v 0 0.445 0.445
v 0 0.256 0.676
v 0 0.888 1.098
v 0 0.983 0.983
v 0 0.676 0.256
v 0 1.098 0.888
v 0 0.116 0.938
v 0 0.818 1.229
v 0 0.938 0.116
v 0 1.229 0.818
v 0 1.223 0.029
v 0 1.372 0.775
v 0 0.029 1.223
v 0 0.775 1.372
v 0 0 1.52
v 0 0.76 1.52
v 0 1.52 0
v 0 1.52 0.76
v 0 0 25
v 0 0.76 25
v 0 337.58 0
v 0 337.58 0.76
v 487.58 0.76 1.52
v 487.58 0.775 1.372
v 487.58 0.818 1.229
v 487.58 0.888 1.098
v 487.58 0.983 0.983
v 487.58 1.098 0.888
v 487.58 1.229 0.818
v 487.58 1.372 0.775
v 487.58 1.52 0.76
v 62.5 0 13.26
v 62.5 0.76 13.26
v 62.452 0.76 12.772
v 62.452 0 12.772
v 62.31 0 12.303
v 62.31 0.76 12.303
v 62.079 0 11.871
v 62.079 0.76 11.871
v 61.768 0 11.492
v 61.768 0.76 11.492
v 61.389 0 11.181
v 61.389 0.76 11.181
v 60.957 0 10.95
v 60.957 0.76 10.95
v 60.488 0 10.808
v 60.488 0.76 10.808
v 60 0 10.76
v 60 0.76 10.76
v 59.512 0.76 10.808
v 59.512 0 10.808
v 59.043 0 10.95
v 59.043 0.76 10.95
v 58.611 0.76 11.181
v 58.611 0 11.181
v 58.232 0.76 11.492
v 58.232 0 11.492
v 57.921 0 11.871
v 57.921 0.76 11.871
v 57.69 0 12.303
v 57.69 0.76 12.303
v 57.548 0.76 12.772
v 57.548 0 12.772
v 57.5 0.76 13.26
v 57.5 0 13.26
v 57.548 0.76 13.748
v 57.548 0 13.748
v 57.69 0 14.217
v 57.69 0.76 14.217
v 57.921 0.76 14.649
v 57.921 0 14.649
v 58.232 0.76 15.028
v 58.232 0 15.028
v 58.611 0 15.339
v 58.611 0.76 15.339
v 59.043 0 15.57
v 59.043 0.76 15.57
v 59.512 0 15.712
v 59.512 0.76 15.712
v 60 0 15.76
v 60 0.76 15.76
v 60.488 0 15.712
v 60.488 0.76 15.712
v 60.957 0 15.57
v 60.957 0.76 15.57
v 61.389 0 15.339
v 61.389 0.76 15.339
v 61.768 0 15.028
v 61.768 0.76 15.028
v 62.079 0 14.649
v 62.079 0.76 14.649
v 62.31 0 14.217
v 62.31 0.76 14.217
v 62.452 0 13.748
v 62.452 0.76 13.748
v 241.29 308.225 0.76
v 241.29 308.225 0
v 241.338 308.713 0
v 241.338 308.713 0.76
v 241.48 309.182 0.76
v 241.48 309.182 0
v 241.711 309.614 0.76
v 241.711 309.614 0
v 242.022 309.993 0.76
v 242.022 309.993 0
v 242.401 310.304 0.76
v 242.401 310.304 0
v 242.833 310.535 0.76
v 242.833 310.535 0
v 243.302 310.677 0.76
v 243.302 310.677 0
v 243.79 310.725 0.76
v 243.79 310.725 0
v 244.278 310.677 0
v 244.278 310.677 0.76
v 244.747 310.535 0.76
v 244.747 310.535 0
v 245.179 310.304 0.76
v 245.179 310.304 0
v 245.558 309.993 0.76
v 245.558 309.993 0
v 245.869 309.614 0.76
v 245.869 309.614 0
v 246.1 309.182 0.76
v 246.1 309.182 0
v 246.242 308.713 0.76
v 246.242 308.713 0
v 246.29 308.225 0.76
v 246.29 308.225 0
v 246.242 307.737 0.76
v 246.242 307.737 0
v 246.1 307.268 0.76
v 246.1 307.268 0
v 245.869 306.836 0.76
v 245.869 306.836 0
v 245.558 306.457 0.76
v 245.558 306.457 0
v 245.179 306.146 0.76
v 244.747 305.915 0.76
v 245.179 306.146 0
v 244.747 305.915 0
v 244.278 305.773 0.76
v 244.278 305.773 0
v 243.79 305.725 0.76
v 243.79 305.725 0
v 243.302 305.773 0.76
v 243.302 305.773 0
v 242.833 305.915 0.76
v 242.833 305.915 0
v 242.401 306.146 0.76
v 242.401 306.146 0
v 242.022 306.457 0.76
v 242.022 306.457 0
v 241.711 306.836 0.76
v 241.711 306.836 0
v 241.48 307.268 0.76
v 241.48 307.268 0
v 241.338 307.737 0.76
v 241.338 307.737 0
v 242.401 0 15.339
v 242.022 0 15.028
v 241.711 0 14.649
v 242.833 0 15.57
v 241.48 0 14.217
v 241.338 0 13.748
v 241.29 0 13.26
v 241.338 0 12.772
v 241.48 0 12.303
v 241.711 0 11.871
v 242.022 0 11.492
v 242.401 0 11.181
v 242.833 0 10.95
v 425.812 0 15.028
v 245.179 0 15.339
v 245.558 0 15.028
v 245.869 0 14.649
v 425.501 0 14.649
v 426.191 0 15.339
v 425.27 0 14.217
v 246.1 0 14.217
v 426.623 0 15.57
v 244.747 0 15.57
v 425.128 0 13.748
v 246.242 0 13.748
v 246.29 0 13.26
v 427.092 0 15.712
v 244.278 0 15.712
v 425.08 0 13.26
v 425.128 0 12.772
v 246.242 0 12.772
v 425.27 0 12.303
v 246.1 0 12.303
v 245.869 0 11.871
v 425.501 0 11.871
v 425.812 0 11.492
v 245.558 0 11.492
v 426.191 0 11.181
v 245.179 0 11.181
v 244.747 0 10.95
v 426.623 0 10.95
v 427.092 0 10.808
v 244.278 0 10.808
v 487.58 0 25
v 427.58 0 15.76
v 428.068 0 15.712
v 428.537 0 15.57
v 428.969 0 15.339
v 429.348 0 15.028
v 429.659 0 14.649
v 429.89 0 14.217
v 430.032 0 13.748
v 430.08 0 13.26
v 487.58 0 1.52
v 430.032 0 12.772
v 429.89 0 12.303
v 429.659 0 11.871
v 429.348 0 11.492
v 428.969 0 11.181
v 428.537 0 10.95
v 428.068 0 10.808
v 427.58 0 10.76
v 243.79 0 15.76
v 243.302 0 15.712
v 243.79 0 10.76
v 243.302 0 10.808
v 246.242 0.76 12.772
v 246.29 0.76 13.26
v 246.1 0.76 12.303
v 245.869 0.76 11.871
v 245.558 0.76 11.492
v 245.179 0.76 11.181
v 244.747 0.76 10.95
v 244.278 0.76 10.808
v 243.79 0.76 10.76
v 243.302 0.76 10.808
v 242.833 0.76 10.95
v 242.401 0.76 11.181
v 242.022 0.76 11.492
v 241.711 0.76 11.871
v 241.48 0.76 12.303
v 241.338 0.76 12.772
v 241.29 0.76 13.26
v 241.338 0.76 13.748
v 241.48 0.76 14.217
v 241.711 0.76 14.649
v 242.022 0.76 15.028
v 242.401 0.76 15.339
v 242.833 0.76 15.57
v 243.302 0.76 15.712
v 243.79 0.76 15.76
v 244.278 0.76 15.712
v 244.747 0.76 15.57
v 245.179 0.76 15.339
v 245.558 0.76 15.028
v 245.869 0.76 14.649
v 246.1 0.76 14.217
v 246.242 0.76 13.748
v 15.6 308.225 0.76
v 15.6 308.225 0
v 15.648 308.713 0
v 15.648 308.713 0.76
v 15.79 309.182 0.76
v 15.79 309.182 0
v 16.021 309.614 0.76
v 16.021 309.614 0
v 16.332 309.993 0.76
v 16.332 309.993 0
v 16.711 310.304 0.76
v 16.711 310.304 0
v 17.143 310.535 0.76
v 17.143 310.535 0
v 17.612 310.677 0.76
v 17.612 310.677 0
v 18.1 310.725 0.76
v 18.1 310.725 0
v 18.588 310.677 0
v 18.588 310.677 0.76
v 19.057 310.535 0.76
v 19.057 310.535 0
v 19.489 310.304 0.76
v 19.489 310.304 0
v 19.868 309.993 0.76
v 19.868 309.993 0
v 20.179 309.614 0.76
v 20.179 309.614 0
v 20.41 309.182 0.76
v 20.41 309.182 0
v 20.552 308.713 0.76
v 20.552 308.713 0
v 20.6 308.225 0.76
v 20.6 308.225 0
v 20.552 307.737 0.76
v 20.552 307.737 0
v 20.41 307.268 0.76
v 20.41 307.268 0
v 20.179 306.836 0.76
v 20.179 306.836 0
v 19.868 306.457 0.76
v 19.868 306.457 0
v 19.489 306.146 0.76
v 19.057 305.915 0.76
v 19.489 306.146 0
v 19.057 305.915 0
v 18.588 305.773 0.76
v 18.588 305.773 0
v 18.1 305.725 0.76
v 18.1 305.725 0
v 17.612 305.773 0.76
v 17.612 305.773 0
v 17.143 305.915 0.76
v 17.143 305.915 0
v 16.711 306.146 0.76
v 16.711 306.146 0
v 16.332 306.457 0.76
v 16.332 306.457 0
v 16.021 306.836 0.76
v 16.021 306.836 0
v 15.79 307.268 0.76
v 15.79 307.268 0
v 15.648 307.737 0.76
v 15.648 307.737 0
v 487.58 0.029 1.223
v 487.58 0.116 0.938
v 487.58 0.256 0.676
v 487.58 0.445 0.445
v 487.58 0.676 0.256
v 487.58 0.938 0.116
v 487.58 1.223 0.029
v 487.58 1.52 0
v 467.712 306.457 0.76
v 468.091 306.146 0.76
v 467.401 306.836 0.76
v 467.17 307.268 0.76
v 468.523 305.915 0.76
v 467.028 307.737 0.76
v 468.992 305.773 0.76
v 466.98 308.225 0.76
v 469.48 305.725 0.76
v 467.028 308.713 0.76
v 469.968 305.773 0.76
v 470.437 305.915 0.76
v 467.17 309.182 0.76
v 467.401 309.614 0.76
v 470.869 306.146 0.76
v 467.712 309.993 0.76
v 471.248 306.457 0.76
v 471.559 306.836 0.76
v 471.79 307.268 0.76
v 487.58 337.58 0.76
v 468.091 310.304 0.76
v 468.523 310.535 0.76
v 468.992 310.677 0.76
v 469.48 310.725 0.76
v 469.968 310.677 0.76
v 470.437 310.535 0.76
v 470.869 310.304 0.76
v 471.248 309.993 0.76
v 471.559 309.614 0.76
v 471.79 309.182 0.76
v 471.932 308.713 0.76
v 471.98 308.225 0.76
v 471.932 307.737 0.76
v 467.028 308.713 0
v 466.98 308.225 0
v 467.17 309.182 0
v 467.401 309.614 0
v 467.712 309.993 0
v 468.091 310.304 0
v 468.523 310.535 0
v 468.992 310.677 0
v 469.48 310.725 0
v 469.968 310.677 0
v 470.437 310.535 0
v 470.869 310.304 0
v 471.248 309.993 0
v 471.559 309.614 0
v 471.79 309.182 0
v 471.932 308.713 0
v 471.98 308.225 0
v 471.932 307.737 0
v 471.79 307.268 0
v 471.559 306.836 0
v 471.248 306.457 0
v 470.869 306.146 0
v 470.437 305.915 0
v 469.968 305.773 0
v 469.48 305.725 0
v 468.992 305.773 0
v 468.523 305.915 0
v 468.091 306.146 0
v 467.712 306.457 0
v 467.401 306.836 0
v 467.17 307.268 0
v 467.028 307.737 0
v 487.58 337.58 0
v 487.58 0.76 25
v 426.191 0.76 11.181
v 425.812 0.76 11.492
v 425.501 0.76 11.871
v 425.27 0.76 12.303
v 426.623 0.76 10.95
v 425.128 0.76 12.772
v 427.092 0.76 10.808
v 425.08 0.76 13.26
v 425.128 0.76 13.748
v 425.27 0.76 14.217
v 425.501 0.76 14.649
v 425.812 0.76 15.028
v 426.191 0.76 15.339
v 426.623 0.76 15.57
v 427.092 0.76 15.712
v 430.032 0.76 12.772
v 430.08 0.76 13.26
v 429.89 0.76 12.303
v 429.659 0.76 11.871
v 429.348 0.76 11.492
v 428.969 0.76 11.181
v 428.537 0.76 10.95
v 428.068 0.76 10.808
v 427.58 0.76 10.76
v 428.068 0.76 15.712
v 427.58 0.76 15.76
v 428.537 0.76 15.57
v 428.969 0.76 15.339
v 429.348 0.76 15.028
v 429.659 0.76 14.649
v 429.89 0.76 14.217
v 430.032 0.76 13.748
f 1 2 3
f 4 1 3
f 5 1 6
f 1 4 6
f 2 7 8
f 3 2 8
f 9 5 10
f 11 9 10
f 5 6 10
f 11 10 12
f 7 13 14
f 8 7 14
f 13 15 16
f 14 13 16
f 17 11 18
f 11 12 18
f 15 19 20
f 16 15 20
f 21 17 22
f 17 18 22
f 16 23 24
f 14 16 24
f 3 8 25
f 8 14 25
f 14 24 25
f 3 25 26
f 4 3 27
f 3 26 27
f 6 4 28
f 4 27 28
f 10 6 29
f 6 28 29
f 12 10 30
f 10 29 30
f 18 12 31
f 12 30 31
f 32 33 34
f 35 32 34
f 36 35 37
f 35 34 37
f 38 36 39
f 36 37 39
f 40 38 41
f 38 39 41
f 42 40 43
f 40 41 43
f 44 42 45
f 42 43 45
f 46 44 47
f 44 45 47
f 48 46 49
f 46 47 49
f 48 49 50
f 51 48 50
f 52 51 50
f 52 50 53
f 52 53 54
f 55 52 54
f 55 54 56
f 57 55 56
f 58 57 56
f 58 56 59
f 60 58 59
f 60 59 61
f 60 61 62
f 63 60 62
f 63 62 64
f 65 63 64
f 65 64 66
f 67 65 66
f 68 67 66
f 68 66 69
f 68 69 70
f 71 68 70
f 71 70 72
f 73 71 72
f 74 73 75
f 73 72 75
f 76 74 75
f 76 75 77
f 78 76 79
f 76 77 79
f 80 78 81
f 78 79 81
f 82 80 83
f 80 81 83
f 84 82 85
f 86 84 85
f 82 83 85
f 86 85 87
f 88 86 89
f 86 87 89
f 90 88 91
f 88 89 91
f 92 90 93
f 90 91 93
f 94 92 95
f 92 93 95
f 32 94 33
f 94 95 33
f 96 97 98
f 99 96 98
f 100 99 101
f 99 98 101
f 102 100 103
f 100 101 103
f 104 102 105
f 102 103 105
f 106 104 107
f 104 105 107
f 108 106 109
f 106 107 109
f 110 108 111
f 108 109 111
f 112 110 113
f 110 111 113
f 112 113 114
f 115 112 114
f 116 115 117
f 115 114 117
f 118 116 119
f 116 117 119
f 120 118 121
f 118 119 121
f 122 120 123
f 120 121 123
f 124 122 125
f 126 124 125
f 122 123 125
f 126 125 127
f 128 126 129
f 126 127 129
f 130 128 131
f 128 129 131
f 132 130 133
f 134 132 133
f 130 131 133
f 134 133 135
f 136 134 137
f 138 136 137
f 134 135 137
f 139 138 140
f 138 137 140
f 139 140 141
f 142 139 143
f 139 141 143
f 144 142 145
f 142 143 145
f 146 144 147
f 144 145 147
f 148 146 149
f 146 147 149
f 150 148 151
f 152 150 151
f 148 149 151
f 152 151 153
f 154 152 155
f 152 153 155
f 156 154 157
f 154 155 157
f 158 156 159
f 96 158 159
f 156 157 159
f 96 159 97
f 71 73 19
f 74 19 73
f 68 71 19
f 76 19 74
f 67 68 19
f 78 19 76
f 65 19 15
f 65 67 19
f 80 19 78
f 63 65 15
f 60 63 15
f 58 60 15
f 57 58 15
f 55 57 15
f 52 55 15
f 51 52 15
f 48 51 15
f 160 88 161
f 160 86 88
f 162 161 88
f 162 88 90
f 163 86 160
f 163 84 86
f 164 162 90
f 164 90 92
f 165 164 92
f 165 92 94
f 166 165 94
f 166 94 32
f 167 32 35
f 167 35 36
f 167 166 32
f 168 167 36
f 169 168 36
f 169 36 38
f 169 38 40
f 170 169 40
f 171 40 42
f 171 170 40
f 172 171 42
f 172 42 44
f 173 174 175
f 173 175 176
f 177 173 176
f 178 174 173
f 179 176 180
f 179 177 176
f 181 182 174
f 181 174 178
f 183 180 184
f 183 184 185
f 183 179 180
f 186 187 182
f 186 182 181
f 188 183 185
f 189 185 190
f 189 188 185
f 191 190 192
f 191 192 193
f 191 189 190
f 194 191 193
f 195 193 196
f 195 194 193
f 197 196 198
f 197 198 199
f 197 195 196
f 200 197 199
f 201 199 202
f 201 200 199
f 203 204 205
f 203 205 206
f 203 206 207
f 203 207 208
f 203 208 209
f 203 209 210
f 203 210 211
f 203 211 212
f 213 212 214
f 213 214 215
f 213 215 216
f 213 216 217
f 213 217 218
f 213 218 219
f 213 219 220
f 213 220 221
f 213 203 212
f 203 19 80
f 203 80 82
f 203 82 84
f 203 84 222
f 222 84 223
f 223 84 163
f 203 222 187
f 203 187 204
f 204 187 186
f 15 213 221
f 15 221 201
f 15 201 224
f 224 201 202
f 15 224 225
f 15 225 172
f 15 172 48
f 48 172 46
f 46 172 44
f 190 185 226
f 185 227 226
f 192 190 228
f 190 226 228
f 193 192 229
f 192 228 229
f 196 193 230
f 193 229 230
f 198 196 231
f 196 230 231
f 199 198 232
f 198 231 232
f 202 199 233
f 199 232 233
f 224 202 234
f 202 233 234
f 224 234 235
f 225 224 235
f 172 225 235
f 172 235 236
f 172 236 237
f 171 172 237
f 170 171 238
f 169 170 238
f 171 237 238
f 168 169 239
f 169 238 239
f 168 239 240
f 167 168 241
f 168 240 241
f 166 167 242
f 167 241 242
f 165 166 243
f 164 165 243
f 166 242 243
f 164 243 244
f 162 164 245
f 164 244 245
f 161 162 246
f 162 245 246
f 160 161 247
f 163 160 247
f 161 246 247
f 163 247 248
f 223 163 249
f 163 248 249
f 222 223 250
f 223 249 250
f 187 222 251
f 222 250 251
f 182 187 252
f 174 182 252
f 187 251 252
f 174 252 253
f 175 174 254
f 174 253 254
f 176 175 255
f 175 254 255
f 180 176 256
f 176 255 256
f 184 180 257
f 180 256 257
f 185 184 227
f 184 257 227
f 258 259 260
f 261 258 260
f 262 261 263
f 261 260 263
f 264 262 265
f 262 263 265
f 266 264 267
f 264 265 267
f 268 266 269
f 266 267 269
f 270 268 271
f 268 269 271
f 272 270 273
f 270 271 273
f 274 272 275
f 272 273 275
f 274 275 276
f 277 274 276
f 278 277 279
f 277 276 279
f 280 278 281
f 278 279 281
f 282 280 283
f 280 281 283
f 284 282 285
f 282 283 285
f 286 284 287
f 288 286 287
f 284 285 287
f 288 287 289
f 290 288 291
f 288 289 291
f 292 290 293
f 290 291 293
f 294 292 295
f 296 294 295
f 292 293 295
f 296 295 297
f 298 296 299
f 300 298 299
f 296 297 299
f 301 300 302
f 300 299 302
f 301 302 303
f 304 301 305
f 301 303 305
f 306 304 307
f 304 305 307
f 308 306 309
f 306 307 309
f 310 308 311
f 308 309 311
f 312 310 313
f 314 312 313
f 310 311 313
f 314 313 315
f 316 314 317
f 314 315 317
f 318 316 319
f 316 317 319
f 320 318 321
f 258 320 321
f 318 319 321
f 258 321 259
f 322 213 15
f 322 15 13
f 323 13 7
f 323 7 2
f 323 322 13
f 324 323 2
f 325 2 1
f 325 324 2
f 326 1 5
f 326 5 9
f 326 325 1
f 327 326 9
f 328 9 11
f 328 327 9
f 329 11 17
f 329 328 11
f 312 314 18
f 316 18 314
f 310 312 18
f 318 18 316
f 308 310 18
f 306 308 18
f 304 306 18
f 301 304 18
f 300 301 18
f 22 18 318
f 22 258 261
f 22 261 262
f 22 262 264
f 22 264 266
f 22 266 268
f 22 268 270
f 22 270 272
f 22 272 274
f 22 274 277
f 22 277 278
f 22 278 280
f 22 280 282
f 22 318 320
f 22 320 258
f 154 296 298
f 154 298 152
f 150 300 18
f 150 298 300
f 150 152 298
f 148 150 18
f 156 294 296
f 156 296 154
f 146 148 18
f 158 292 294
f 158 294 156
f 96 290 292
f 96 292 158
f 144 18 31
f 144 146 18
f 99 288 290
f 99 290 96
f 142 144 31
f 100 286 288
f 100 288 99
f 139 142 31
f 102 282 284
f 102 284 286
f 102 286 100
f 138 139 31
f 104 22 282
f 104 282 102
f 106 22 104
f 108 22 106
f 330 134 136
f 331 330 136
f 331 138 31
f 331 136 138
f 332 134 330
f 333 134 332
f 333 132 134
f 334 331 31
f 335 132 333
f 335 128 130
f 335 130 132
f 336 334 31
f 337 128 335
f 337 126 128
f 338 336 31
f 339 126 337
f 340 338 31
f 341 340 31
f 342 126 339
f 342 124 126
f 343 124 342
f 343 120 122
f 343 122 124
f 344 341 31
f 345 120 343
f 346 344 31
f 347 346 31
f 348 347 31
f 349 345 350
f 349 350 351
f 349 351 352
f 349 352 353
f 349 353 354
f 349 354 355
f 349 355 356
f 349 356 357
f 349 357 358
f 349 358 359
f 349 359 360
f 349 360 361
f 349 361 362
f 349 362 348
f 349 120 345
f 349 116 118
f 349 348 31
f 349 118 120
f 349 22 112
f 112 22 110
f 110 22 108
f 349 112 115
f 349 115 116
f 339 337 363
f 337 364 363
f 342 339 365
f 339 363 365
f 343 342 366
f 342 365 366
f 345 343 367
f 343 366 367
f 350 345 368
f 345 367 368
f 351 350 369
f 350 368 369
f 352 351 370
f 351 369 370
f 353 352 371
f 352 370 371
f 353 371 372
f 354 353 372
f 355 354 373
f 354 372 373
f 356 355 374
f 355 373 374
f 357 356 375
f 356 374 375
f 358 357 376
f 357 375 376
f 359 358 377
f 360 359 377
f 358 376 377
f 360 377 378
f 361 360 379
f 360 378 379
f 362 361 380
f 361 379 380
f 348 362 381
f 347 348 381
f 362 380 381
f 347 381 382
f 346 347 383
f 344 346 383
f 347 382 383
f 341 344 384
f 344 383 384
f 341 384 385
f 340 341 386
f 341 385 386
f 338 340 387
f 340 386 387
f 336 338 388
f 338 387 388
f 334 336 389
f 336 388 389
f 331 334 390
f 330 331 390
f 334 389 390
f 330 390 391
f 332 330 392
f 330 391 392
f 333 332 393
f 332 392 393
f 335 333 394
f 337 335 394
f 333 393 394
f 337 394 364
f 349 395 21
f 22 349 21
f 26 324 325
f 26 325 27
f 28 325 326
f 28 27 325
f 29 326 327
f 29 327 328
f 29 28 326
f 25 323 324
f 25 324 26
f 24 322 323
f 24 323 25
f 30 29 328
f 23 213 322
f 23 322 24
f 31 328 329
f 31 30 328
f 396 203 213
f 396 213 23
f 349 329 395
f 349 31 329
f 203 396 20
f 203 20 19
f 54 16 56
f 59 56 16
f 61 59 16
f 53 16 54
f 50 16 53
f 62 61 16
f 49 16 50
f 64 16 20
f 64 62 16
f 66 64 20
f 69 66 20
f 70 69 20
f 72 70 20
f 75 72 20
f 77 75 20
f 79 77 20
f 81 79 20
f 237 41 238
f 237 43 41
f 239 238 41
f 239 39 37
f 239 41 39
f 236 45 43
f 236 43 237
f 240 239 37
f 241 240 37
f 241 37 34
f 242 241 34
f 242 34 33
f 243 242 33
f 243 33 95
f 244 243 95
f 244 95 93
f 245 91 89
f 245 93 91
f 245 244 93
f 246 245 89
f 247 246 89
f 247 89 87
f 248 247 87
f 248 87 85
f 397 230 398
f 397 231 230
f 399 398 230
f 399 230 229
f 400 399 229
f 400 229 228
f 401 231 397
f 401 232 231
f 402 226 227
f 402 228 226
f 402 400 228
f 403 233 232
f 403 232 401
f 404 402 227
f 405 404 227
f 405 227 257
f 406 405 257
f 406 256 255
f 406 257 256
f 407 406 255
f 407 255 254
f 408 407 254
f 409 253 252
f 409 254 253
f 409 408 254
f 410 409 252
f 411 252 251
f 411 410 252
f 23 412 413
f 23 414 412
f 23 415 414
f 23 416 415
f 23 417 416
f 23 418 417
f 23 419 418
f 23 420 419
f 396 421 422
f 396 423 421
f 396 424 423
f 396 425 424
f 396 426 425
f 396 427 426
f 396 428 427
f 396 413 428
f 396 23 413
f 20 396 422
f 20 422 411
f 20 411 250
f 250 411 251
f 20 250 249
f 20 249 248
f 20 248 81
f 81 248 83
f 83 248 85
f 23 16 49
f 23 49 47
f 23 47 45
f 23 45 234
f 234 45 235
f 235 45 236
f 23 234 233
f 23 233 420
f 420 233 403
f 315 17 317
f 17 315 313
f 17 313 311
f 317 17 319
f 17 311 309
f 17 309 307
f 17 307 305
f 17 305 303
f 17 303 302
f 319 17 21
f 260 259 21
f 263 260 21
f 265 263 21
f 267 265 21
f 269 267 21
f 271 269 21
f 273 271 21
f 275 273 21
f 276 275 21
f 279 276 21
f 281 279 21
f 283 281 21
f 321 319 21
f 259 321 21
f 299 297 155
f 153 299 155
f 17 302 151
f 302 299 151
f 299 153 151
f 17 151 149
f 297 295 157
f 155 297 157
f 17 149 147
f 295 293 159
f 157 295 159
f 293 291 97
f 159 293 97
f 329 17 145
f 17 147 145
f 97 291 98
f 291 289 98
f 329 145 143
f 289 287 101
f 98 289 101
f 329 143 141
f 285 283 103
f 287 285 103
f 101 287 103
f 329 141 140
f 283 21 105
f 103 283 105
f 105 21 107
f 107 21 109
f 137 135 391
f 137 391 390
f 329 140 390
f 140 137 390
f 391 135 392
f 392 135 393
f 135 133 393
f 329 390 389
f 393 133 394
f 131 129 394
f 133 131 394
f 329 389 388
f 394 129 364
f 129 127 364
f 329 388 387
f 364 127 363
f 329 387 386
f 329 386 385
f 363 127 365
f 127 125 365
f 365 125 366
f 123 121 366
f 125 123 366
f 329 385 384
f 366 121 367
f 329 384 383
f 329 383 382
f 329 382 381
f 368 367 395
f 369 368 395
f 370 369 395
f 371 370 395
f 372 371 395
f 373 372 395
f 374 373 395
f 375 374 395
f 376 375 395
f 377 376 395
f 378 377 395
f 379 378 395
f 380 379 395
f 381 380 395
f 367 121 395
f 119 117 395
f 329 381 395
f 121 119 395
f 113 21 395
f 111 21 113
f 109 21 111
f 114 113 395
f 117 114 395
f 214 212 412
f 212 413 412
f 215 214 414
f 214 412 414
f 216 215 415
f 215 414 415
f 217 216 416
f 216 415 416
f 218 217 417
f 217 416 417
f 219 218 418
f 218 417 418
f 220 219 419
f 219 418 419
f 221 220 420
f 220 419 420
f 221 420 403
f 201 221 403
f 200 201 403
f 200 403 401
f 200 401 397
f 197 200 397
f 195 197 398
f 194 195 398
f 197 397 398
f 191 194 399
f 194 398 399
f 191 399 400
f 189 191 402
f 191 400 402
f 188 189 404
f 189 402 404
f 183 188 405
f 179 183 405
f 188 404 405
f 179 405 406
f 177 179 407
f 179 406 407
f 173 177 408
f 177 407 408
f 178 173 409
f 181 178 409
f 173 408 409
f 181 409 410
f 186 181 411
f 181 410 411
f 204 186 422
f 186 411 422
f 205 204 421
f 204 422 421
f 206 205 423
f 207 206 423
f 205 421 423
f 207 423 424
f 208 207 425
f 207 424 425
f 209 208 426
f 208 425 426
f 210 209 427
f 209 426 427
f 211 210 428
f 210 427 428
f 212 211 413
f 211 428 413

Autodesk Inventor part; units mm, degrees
ref_plane "YZ Plane" through (0, 0, 0) normal (1, 0, 0) x (0, 1, 0)
ref_plane "XZ Plane" through (0, 0, 0) normal (0, 1, 0) x (-1, 0, 0)
ref_plane "XY Plane" through (0, 0, 0) normal (0, 0, 1) x (1, 0, 0)
sketch "Boceto1" plane through (0, 0, 0) normal (0, 0, 1) x (1, 0, 0)
  line L0 (0, 0) -> (487.58, 0)
  line L1 (487.58, 0) -> (487.58, 337.58)
  line L2 (487.58, 337.58) -> (0, 337.58)
  line L3 (0, 337.58) -> (0, 0)
  dimension "d0" = 487.58
  dimension "d1" = 337.58
extrude "Placa1" add sketch "Boceto1" along normal blind 0.76
sketch "Boceto2" plane through (487.58, 0.76, 0) normal (0, -1, 0) x (1, 0, 0)
  line L0 (-487.58, 0) -> (0, 0)
  line L1 (0, 0) -> (0, 25)
  line L2 (0, 25) -> (-487.58, 25)
  line L3 (-487.58, 25) -> (-487.58, 0)
edge flange "Pestaña1" height 25 angle 90 thickness 0.76 bend radius 0.76 thickness toward (0, -1, 0) relief tear relief width 0.76 relief depth 0.38 edges at (243.79, 0, 0.76) wall of the first edge with corners at (0, 0.76, 0) (487.58, 0.76, 0) (487.58, 0.76, 25) (0, 0.76, 25)
bend "Doblez1"
corner "Esquina1"
sketch "Boceto3" plane through (0, 0, 0) normal (0, 0, -1) x (-1, 0, 0)
  circle A0 centre (-469.48, 308.225) radius 2.5 projected
  circle A1 centre (-243.79, 308.225) radius 2.5 projected
  circle A2 centre (-18.1, 308.225) radius 2.5 projected
  point P0 (0, 0)
extrude "Cortar1" cut sketch "Boceto3" against normal blind 0.76
sketch "Boceto4" plane through (0, 0.76, 25) normal (0, 1, 0) x (1, 0, 0)
  line L0 (0, 23.48) -> (0, 0) projected
  line L1 (487.58, 23.48) -> (487.58, 0) projected
  line L2 (0, 0) -> (487.58, 0) projected
  line L3 (0, 23.48) -> (487.58, 23.48) projected
  line L4 (0, 23.48) -> (0, 0) projected
  circle A0 centre (60, 11.74) radius 2.5
  circle A1 centre (243.79, 11.74) radius 2.5
  circle A2 centre (427.58, 11.74) radius 2.5
  point P0 (0, 25)
  dimension "d15" = 60
  dimension "d16" = 60
  dimension "d17" = 5
  dimension "d18" = 5
  dimension "d19" = 5
extrude "Extrusión1" cut sketch "Boceto4" against normal through all contours A0 | A1 | A2
thread "Rosca1" size "M5x0.8" class "6H" standard "ANSI Metric M Profile" length 16
thread "Rosca2" size "M5x0.8" class "6H" standard "ANSI Metric M Profile" length 16
thread "Rosca3" size "M5x0.8" class "6H" standard "ANSI Metric M Profile" length 16
equation "\"d13\" = Grosor"
equation "\"d18\" = d17"
equation "\"d19\" = d17"
equation "\"d2\" = Grosor"
equation "\"d3\" = Anchura_desahogo_plegado"
equation "\"d4\" = Profundidad_desahogo_plegado"
equation "\"d5\" = Remanente_mínimo"
equation "\"d6\" = Radiodetransición"
equation "\"d9\" = Radio_pliegue"
equation "\"d10\" = Tamaño_destalonado"
equation "\"d11\" = TamañoSeparación"
equation "\"d12\" = Tamaño_de_radio_de_Jacobi"
equation "\"Radio_pliegue\" = Grosor"
equation "\"Anchura_desahogo_plegado\" = Grosor"
equation "\"Profundidad_desahogo_plegado\" = 0.5 * Grosor"
equation "\"Tamaño_destalonado\" = 4 * Grosor"
equation "\"Remanente_mínimo\" = 2 * Grosor"
equation "\"Radiodetransición\" = Radio_pliegue"
equation "\"Tamaño_de_radio_de_Jacobi\" = Radio_pliegue"
equation "\"TamañoSeparación\" = Grosor"
equation "\"Grosor\" = 0.76"
properties part number "Tapa_interior_2" material "Acero AISI 1006 85 LC"
